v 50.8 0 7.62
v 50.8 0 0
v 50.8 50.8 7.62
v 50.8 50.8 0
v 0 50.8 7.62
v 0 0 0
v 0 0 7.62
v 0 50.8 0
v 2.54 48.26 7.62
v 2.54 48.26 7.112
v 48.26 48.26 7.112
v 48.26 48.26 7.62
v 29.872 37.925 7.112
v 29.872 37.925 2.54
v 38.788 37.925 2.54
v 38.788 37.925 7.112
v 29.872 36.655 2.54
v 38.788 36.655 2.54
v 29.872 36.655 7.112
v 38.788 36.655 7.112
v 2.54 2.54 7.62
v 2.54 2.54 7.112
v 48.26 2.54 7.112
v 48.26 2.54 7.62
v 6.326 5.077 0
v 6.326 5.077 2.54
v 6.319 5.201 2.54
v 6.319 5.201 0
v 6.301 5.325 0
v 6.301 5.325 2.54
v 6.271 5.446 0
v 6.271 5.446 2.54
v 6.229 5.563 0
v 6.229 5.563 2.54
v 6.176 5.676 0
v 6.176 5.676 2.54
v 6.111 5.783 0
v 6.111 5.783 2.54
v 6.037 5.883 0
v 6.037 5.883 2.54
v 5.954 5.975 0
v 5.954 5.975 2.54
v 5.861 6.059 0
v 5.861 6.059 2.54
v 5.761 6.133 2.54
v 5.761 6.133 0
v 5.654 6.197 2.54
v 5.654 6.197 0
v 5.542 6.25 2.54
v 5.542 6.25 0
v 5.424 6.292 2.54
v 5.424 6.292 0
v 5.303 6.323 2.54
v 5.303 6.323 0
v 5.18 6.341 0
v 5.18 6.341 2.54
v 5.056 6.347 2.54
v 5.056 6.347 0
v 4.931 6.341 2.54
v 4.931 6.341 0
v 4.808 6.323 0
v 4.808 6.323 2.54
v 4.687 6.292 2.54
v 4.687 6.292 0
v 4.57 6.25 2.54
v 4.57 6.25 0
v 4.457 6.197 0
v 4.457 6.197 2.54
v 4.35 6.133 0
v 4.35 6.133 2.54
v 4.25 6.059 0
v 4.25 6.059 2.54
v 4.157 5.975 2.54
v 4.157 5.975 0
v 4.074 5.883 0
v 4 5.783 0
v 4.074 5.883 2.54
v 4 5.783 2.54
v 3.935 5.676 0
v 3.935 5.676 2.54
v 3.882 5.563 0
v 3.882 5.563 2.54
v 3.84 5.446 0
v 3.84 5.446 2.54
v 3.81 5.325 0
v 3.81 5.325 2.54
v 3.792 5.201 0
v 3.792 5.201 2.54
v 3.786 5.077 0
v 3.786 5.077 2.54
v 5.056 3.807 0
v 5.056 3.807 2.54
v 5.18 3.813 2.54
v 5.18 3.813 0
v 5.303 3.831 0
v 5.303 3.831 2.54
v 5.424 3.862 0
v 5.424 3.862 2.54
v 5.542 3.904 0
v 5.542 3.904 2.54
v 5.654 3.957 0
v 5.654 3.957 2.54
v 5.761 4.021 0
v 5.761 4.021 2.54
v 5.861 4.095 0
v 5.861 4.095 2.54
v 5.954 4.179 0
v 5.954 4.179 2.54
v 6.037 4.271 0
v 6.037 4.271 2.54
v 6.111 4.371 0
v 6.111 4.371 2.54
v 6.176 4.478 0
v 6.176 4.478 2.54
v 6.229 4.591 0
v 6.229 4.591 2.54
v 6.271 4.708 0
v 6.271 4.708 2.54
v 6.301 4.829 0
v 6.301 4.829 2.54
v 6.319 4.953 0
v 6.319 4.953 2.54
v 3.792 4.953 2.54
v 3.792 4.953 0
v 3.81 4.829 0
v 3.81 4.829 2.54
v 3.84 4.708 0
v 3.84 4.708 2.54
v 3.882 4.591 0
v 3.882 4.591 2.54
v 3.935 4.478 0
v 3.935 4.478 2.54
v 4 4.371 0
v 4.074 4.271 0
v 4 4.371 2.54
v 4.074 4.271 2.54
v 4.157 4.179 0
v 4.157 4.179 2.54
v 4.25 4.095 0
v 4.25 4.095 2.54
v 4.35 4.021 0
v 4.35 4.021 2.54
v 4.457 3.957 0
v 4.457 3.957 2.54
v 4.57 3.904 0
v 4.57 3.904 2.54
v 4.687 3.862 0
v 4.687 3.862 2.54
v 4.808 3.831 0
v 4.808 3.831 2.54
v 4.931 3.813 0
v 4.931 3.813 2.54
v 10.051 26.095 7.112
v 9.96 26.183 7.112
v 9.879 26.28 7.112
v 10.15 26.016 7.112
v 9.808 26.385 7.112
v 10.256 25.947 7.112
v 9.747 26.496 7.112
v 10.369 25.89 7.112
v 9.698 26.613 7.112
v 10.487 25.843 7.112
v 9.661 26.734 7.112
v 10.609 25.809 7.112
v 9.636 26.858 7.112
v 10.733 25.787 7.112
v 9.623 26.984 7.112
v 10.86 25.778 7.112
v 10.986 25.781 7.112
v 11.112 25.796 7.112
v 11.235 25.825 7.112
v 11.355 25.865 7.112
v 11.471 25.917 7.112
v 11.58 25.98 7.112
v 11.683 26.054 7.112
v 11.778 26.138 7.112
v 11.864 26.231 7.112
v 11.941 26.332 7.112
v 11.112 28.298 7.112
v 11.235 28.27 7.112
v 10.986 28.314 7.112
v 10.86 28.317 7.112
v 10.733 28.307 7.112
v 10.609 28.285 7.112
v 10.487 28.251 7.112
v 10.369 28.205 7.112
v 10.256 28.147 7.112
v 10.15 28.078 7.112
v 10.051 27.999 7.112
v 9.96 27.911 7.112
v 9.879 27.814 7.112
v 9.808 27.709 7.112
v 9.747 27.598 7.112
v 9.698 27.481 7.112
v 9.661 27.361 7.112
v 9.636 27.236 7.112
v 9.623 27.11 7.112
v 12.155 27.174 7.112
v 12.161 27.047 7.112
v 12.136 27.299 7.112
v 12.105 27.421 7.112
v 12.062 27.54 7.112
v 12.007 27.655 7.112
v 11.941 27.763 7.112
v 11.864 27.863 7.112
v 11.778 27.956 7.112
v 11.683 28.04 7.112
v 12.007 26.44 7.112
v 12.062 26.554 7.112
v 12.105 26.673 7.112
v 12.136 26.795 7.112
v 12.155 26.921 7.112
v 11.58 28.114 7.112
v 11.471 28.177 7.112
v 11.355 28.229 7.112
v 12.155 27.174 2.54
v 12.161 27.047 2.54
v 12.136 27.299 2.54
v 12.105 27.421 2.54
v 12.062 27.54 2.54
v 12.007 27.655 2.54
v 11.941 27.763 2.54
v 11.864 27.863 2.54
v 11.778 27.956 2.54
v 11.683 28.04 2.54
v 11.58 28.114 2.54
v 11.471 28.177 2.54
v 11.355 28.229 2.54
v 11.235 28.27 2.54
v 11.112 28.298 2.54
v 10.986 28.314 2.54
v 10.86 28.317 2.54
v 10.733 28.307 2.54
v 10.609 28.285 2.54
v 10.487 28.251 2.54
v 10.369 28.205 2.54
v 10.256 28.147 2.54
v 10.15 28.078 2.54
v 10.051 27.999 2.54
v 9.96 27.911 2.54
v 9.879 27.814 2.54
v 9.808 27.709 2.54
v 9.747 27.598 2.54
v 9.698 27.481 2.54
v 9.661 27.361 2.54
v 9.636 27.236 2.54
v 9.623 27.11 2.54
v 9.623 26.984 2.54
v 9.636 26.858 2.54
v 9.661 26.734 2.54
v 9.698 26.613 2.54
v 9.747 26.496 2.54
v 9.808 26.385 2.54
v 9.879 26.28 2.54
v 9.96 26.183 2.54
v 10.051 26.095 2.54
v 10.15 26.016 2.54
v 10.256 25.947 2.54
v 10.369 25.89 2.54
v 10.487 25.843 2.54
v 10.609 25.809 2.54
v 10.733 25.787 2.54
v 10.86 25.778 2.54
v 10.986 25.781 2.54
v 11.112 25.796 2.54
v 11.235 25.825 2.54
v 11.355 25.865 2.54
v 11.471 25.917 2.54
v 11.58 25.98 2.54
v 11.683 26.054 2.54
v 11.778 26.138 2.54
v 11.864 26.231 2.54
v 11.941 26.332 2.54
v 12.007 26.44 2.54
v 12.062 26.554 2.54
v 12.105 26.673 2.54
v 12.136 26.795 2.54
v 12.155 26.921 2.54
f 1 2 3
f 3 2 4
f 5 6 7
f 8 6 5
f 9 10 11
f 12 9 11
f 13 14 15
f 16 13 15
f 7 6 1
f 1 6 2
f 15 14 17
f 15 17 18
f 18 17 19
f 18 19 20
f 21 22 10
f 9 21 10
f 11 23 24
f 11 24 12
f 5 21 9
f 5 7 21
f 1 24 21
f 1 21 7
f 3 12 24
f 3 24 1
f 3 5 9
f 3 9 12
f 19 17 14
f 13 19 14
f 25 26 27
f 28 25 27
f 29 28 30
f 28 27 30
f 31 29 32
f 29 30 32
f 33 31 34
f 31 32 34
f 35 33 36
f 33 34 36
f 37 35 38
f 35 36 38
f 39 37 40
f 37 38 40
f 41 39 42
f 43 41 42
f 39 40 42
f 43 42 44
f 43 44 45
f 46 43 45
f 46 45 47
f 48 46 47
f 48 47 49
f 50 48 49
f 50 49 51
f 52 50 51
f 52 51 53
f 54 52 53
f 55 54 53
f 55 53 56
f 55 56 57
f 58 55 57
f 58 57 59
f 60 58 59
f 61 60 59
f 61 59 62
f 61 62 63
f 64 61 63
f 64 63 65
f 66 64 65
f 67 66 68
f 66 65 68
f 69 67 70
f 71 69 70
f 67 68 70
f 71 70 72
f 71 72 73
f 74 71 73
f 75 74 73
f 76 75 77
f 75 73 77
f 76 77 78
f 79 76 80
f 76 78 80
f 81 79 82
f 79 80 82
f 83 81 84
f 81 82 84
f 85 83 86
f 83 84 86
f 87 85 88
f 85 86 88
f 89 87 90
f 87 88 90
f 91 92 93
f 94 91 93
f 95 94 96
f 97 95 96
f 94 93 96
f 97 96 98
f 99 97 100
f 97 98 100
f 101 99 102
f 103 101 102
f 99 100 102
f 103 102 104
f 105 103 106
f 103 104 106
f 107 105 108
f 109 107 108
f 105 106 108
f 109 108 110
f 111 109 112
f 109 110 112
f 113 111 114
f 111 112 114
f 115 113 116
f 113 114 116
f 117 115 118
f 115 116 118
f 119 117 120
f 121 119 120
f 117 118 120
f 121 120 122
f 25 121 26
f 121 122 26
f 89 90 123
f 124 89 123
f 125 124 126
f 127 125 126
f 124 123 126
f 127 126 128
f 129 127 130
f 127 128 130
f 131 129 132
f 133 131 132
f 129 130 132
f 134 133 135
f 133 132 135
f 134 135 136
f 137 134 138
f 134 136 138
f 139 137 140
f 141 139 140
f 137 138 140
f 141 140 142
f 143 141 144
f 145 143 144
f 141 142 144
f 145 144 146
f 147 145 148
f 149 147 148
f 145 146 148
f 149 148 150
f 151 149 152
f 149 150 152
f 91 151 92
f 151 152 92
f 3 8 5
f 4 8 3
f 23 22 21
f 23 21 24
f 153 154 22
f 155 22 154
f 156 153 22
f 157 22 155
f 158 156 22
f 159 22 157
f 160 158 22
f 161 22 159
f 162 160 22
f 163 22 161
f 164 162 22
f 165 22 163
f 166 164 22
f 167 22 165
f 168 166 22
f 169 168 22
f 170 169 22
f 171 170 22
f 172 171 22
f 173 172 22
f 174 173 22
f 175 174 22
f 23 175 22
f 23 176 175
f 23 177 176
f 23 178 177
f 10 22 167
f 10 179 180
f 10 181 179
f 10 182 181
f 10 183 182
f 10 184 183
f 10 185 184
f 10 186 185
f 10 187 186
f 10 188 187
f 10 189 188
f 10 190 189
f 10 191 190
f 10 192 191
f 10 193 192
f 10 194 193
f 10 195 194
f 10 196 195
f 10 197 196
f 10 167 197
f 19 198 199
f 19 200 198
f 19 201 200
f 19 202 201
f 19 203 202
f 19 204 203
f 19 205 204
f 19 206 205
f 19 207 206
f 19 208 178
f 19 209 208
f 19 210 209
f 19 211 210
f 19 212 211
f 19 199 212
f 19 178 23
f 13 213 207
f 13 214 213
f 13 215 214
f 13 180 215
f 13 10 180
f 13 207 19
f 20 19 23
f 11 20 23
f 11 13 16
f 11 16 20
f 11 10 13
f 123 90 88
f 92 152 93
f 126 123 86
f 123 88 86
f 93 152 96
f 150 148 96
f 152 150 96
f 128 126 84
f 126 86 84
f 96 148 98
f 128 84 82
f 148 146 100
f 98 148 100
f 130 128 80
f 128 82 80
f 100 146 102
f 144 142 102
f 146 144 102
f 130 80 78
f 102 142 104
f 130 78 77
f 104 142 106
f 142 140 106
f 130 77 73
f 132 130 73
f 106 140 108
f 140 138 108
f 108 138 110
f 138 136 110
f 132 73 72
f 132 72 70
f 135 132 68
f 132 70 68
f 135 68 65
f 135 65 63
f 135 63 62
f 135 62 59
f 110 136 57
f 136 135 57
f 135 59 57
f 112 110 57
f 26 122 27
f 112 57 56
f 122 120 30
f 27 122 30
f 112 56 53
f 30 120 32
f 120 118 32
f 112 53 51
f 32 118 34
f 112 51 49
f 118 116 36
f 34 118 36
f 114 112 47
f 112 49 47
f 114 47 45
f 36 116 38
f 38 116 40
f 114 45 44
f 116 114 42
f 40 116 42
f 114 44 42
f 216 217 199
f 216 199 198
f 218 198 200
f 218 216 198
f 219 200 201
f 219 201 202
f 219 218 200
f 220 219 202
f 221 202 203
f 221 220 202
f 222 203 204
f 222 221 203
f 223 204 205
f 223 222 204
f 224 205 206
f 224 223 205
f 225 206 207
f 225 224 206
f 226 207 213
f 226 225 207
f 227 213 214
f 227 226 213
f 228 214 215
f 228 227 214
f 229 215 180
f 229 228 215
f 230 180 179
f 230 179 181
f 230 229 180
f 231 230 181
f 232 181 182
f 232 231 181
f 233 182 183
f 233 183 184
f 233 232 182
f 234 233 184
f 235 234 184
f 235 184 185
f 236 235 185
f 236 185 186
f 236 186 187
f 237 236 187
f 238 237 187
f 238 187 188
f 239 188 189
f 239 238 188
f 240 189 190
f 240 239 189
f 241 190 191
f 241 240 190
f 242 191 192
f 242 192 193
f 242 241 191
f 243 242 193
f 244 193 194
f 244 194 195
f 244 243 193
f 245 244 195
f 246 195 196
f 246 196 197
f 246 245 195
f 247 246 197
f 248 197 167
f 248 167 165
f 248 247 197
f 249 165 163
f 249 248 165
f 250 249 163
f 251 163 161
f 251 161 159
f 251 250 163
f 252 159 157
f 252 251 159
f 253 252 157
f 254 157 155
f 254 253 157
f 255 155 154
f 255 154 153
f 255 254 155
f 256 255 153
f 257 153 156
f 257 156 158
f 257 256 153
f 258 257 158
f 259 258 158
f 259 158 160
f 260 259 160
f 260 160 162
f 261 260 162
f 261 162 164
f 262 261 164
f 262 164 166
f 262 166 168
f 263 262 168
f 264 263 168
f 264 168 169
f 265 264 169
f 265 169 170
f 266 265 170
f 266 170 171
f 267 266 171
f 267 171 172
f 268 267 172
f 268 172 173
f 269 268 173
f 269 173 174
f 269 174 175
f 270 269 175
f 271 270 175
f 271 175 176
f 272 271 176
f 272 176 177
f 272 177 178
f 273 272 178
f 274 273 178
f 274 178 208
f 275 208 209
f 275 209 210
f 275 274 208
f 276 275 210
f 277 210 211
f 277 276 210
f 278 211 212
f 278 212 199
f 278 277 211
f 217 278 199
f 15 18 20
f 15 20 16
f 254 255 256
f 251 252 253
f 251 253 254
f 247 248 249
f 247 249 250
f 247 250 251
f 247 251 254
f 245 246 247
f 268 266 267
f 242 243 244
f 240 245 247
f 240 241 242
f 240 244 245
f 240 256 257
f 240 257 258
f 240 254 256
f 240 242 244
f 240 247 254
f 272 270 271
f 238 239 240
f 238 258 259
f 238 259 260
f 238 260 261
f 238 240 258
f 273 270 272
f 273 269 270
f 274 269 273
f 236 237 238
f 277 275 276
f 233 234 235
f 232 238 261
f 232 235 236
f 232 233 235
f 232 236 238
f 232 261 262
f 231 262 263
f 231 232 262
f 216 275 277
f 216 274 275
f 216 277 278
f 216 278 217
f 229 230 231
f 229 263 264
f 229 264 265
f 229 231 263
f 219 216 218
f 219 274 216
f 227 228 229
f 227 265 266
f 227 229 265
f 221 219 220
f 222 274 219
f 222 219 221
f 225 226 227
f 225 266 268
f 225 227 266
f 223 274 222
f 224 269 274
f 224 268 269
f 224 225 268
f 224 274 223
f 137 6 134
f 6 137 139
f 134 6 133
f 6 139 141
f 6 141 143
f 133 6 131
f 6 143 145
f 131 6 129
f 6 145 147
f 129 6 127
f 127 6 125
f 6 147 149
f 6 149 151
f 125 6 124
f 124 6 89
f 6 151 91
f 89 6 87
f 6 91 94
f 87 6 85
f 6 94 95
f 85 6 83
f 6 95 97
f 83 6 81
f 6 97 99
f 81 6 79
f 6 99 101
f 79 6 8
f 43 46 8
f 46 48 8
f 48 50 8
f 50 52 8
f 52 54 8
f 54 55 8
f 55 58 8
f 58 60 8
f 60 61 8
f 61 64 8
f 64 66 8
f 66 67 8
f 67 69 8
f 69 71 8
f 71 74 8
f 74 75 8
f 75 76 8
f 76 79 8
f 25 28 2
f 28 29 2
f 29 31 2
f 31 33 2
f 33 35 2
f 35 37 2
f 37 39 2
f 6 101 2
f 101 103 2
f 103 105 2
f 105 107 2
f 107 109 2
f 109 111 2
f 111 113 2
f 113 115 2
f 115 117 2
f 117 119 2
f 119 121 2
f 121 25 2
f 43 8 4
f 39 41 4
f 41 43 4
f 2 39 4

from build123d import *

# Parameters (mm, degrees)
F0_W     = 50.8
F0_H     = 50.8
F1_DEPTH = 7.62
F2_T     = -2.54
F5_DEPTH = 25.4
F7_R     = 1.27
F7_W     = 8.9154
F7_H     = 1.27
F8_DEPTH = 4.572


with BuildPart() as f1:
    # F0 (on Top) → F1 (new body)
    with BuildSketch(Plane.XY):
        with Locations((25.4, 25.4)):
            Rectangle(F0_W, F0_H)
    extrude(amount=F1_DEPTH)

    # F2
    f2_openings = [f1.faces().sort_by_distance(p)[0] for p in [
        (25.4, 25.4, 7.62),
    ]]
    offset(amount=F2_T, openings=f2_openings)

    # F4 (on face) → F5 (cut)
    with BuildSketch(Plane.XY.offset(2.54)):
        with BuildLine():
            ThreePointArc((3.7855220646, 5.0770083749), (4.1574964525, 4.1789827628), (5.0555220646, 3.8070083749))
            Line((5.0555220646, 3.8070083749), (5.0555220646, 5.0770083749))
            Line((5.0555220646, 5.0770083749), (3.7855220646, 5.0770083749))
        make_face()
        with BuildLine():
            Line((5.0555220646, 5.0770083749), (5.0555220646, 3.8070083749))
            ThreePointArc((5.0555220646, 3.8070083749), (5.9535476767, 4.1789827628), (6.3255220646, 5.0770083749))
            ThreePointArc((6.3255220646, 5.0770083749), (5.0555220646, 6.3470083749), (3.7855220646, 5.0770083749))
            Line((3.7855220646, 5.0770083749), (5.0555220646, 5.0770083749))
        make_face()
    extrude(amount=-F5_DEPTH, mode=Mode.SUBTRACT)

    # F7 (on face) → F8 (join)
    with BuildSketch(Plane.XY.offset(2.54)):
        Polygon((48.26, 2.54), (48.26, 48.26), (2.54, 48.26), (2.54, 2.54), (7.62, 2.54), align=None)
        with Locations((10.8913211152, 27.047118172)):
            Circle(F7_R, mode=Mode.SUBTRACT)
        with Locations((34.3299443565, 37.2895654833)):
            Rectangle(F7_W, F7_H, mode=Mode.SUBTRACT)
    extrude(amount=F8_DEPTH)


solid = f1.part
